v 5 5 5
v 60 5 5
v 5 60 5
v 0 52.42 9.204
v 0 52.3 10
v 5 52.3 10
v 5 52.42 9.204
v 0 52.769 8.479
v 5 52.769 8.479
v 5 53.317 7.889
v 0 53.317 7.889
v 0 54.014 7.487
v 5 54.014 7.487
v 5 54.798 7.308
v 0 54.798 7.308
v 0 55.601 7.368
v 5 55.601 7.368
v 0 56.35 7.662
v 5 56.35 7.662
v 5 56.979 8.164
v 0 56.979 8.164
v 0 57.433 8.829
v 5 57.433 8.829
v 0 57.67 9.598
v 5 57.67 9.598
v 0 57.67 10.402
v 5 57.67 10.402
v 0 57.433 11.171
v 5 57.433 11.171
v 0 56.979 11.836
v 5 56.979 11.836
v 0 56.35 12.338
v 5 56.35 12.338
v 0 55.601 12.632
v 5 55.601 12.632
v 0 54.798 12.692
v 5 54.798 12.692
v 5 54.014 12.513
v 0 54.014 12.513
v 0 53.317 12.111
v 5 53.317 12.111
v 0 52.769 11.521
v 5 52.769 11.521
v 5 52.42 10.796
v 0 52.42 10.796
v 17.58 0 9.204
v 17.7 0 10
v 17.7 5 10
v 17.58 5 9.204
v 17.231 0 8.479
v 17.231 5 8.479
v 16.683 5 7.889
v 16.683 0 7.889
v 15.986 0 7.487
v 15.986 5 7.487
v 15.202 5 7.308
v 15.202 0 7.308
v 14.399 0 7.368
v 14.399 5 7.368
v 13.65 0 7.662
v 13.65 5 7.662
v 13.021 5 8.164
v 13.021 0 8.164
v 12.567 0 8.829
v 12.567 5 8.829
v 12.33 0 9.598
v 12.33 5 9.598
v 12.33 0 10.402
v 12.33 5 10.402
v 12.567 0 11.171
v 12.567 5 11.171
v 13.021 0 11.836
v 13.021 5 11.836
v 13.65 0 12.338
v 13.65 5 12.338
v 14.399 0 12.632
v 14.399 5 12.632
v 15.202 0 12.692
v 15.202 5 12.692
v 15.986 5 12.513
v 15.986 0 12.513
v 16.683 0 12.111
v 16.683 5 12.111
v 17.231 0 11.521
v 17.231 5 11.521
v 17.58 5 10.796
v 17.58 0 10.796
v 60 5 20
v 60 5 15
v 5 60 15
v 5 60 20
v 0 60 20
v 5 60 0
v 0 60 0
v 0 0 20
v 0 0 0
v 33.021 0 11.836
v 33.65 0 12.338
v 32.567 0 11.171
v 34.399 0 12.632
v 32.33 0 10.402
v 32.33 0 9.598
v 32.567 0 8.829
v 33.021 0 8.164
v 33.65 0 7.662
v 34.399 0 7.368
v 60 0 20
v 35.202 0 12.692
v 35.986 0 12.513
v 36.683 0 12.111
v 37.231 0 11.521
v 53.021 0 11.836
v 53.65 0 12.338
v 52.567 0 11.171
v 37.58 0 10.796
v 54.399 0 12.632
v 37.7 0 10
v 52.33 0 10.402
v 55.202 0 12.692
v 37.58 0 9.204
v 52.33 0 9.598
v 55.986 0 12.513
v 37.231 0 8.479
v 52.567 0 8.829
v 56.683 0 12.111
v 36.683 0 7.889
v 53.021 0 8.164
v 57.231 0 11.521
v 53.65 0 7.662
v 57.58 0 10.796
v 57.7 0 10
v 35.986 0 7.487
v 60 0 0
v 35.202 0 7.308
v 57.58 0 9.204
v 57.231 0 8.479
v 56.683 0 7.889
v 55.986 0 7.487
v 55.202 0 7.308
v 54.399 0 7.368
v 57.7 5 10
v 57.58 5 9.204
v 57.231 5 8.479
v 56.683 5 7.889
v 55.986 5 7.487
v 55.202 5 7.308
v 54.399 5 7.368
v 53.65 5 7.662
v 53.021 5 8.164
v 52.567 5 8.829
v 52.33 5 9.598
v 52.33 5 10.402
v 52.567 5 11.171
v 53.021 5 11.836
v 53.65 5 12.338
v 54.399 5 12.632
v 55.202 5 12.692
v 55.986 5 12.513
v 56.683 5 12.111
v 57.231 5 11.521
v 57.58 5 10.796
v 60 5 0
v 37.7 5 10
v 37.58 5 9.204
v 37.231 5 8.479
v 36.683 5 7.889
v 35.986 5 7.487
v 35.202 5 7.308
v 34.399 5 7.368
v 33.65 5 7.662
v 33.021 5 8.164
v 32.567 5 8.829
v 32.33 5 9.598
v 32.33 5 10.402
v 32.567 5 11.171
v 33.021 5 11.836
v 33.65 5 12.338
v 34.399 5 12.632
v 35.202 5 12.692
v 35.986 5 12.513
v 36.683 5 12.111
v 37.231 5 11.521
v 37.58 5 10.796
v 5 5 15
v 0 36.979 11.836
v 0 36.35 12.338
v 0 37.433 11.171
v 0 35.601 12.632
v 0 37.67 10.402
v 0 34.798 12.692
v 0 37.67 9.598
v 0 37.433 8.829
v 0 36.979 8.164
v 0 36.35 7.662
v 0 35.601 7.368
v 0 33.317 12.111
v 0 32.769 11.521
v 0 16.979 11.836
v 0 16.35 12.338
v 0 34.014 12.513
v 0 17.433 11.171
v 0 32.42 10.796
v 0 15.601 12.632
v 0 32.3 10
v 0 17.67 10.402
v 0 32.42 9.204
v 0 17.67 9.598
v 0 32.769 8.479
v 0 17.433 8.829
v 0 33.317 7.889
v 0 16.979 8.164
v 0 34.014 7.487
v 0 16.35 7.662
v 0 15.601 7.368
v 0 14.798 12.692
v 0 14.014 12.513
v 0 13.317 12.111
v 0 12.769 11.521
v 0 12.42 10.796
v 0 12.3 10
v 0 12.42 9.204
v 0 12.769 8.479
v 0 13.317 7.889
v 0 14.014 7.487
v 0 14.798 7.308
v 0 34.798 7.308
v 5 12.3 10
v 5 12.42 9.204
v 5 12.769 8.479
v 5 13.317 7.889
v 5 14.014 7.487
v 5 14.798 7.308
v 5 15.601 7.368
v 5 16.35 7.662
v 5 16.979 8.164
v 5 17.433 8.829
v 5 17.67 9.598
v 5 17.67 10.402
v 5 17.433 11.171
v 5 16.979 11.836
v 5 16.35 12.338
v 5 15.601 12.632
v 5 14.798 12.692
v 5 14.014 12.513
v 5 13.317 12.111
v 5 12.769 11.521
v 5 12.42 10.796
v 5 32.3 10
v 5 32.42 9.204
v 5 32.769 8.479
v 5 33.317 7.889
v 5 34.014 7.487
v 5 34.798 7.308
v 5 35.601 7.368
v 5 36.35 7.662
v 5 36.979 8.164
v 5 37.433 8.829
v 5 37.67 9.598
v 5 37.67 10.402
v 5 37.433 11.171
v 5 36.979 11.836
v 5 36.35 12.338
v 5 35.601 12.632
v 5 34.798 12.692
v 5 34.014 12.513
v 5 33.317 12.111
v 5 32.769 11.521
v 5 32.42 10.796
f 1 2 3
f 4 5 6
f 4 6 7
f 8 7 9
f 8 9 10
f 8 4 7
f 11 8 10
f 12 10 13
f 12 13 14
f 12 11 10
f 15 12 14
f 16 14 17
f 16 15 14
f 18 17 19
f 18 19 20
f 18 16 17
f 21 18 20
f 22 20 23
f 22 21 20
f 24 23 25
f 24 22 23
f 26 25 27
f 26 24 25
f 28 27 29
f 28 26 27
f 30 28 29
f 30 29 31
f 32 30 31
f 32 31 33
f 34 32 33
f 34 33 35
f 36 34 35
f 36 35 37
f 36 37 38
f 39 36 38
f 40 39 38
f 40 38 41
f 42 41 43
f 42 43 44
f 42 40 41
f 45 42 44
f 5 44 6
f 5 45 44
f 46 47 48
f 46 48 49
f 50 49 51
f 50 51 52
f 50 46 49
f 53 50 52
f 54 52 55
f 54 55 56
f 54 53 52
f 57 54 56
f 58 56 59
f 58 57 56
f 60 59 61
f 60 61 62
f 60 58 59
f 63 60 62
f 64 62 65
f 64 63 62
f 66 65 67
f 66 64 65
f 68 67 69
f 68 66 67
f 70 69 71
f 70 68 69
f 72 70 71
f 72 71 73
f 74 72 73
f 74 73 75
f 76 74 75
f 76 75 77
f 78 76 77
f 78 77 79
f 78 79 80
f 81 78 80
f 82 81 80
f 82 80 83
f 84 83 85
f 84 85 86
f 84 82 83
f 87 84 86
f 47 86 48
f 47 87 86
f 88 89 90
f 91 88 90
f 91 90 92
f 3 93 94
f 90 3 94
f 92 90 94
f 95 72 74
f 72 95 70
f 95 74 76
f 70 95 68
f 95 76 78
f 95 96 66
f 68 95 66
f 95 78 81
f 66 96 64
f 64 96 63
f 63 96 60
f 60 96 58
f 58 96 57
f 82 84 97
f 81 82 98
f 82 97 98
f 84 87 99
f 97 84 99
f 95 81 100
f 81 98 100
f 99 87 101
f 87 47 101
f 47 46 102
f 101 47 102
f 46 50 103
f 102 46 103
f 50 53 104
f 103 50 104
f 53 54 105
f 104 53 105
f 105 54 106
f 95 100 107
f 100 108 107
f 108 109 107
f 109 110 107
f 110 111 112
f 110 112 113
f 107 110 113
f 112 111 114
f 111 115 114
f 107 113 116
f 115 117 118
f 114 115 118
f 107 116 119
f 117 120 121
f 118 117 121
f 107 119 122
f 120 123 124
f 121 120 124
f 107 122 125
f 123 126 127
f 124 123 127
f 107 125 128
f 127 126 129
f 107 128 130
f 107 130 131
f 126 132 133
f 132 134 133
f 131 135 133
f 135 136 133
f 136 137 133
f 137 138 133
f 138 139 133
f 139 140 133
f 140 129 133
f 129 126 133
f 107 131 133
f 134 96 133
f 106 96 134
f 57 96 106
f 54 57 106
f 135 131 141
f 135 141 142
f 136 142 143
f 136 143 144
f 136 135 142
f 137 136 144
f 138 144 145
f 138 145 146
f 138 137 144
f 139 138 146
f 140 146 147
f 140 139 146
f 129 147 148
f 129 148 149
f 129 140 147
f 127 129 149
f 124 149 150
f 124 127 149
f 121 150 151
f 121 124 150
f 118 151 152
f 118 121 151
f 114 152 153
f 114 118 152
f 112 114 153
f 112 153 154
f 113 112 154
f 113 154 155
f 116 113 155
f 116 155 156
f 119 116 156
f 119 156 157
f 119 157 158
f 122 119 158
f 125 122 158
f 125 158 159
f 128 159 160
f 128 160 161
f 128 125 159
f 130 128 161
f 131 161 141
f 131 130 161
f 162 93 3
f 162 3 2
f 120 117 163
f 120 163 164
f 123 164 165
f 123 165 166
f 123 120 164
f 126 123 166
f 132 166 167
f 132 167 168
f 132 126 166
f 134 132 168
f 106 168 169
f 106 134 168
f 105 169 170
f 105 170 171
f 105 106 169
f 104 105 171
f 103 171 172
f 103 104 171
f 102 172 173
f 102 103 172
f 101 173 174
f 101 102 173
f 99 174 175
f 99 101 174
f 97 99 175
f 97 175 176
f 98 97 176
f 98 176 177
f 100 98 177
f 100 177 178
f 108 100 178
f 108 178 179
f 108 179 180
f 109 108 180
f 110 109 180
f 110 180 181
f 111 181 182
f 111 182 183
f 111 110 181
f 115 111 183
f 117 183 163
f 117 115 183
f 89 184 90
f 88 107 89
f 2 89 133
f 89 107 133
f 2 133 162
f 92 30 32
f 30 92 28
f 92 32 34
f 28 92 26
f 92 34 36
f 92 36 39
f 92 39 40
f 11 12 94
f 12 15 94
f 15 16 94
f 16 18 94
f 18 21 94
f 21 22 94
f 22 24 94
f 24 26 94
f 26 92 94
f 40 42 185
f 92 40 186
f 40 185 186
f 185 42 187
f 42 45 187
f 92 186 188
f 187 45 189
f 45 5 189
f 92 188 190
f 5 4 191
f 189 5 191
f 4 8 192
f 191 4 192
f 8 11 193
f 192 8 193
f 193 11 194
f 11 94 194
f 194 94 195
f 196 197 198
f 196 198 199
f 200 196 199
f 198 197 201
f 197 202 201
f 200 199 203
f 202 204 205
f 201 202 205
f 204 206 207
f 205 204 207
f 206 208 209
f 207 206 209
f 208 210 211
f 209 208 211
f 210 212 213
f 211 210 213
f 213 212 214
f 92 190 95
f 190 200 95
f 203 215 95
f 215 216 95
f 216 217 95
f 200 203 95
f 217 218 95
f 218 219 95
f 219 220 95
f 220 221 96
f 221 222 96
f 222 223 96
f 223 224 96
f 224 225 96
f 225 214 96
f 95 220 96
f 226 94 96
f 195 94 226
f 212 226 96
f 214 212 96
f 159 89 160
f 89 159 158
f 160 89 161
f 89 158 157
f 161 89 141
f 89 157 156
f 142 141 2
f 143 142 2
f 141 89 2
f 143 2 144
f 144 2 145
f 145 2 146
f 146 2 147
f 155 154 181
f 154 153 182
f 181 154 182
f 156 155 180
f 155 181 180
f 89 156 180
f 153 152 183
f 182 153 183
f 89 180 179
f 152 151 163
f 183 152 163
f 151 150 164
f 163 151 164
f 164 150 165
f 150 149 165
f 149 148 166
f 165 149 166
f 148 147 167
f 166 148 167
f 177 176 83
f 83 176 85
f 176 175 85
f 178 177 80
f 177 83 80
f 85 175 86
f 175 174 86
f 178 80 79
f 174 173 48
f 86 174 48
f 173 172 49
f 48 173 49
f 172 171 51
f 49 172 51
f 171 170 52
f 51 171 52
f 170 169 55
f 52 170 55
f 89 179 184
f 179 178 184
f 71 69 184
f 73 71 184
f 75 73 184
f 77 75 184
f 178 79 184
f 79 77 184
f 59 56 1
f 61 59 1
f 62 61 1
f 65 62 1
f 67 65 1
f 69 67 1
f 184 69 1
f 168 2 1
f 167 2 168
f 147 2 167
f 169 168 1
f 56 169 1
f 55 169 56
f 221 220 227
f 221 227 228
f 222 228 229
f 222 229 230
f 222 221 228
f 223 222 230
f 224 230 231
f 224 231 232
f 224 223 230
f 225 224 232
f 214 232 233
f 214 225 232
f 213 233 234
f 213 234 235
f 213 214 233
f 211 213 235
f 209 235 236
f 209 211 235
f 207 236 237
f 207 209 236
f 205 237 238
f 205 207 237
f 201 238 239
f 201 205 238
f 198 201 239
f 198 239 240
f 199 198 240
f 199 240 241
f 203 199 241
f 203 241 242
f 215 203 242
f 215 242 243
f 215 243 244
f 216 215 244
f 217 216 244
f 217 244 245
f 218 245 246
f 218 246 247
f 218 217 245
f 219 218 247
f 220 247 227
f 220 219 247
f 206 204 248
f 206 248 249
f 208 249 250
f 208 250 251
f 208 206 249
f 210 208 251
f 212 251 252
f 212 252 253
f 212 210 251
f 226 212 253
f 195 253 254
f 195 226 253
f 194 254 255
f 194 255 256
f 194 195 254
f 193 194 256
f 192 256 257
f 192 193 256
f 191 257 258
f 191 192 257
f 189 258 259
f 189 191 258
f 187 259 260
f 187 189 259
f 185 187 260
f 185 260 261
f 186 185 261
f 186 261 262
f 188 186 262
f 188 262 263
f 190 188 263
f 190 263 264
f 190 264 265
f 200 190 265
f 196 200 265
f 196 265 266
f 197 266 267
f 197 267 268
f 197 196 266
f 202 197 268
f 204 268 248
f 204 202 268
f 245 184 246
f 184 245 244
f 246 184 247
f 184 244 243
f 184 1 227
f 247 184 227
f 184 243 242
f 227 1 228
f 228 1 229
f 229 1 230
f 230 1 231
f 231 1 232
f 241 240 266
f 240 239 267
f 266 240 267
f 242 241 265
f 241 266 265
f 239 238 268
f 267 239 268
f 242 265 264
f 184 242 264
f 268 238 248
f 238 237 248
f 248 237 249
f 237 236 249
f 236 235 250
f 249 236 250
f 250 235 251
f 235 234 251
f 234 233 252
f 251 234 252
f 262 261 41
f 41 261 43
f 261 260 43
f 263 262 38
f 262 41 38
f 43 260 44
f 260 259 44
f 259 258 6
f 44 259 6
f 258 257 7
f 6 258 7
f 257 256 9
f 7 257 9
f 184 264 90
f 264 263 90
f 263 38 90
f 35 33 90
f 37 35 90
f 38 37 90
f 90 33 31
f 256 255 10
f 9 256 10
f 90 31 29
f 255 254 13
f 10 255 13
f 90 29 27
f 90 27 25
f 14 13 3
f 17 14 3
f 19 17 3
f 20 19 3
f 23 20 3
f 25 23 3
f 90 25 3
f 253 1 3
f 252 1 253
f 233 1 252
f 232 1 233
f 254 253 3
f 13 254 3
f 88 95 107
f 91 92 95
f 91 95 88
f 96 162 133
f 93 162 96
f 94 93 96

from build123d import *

# Parameters (mm, degrees)
CYLINDER001_R     = 2.7
CYLINDER001_DEPTH = 5
CYLINDER002_R     = 2.7
CYLINDER002_DEPTH = 5
CYLINDER004_R     = 2.7
CYLINDER004_DEPTH = 5
CYLINDER003_R     = 2.7
CYLINDER003_DEPTH = 5
CYLINDER005_R     = 2.7
CYLINDER005_DEPTH = 5
CYLINDER_R        = 2.7
CYLINDER_DEPTH    = 5
PAD_DEPTH         = 5
PAD001_DEPTH      = 10
PAD002_DEPTH      = 5


with BuildPart() as cylinder001:
    # Cylinder001 → Cylinder001 (new body)
    with BuildSketch(Plane(origin=(55, 0, 10), x_dir=(1, 0, 0), z_dir=(0, 1, 0))):
        Circle(CYLINDER001_R)
    extrude(amount=CYLINDER001_DEPTH)


with BuildPart() as cylinder002:
    # Cylinder002 → Cylinder002 (new body)
    with BuildSketch(Plane(origin=(0, 15, 10), x_dir=(0, -1, 0), z_dir=(1, 0, 0))):
        Circle(CYLINDER002_R)
    extrude(amount=CYLINDER002_DEPTH)


with BuildPart() as cylinder004:
    # Cylinder004 → Cylinder004 (new body)
    with BuildSketch(Plane(origin=(35, 0, 10), x_dir=(1, 0, 0), z_dir=(0, 1, 0))):
        Circle(CYLINDER004_R)
    extrude(amount=CYLINDER004_DEPTH)


with BuildPart() as cylinder003:
    # Cylinder003 → Cylinder003 (new body)
    with BuildSketch(Plane(origin=(0, 55, 10), x_dir=(0, -1, 0), z_dir=(1, 0, 0))):
        Circle(CYLINDER003_R)
    extrude(amount=CYLINDER003_DEPTH)


with BuildPart() as cylinder005:
    # Cylinder005 → Cylinder005 (new body)
    with BuildSketch(Plane(origin=(0, 35, 10), x_dir=(0, -1, 0), z_dir=(1, 0, 0))):
        Circle(CYLINDER005_R)
    extrude(amount=CYLINDER005_DEPTH)


with BuildPart() as compound:
    # Cylinder → Cylinder (new body)
    with BuildSketch(Plane(origin=(15, 0, 10), x_dir=(1, 0, 0), z_dir=(0, 1, 0))):
        Circle(CYLINDER_R)
    extrude(amount=CYLINDER_DEPTH)

    # Compound: union Cylinder001, Cylinder002, Cylinder004, Cylinder003, Cylinder005
    add(cylinder001.part)
    add(cylinder002.part)
    add(cylinder004.part)
    add(cylinder003.part)
    add(cylinder005.part)


with BuildPart() as f_60mm_bracket:
    # Sketch → Pad (new body)
    with BuildSketch(Plane.XY):
        Polygon((0, 0), (0, 60), (5, 60), (60, 5), (60, 0), align=None)
    extrude(amount=PAD_DEPTH)

    # Sketch001 (on Face7 of Pad) → Pad001 (join)
    with BuildSketch(Plane.XY.offset(5)):
        Polygon((0, 60), (0, 0), (60, 0), (60, 5), (5, 5), (5, 60), align=None)
    extrude(amount=PAD001_DEPTH)

    # Sketch002 (on Face10 of Pad001) → Pad002 (join)
    with BuildSketch(Plane.XY.offset(15)):
        Polygon((0, 60), (0, 0), (60, 0), (60, 5), (5, 60), align=None)
    extrude(amount=PAD002_DEPTH)

    # Cut: cut Compound
    add(compound.part, mode=Mode.SUBTRACT)


solid = f_60mm_bracket.part
